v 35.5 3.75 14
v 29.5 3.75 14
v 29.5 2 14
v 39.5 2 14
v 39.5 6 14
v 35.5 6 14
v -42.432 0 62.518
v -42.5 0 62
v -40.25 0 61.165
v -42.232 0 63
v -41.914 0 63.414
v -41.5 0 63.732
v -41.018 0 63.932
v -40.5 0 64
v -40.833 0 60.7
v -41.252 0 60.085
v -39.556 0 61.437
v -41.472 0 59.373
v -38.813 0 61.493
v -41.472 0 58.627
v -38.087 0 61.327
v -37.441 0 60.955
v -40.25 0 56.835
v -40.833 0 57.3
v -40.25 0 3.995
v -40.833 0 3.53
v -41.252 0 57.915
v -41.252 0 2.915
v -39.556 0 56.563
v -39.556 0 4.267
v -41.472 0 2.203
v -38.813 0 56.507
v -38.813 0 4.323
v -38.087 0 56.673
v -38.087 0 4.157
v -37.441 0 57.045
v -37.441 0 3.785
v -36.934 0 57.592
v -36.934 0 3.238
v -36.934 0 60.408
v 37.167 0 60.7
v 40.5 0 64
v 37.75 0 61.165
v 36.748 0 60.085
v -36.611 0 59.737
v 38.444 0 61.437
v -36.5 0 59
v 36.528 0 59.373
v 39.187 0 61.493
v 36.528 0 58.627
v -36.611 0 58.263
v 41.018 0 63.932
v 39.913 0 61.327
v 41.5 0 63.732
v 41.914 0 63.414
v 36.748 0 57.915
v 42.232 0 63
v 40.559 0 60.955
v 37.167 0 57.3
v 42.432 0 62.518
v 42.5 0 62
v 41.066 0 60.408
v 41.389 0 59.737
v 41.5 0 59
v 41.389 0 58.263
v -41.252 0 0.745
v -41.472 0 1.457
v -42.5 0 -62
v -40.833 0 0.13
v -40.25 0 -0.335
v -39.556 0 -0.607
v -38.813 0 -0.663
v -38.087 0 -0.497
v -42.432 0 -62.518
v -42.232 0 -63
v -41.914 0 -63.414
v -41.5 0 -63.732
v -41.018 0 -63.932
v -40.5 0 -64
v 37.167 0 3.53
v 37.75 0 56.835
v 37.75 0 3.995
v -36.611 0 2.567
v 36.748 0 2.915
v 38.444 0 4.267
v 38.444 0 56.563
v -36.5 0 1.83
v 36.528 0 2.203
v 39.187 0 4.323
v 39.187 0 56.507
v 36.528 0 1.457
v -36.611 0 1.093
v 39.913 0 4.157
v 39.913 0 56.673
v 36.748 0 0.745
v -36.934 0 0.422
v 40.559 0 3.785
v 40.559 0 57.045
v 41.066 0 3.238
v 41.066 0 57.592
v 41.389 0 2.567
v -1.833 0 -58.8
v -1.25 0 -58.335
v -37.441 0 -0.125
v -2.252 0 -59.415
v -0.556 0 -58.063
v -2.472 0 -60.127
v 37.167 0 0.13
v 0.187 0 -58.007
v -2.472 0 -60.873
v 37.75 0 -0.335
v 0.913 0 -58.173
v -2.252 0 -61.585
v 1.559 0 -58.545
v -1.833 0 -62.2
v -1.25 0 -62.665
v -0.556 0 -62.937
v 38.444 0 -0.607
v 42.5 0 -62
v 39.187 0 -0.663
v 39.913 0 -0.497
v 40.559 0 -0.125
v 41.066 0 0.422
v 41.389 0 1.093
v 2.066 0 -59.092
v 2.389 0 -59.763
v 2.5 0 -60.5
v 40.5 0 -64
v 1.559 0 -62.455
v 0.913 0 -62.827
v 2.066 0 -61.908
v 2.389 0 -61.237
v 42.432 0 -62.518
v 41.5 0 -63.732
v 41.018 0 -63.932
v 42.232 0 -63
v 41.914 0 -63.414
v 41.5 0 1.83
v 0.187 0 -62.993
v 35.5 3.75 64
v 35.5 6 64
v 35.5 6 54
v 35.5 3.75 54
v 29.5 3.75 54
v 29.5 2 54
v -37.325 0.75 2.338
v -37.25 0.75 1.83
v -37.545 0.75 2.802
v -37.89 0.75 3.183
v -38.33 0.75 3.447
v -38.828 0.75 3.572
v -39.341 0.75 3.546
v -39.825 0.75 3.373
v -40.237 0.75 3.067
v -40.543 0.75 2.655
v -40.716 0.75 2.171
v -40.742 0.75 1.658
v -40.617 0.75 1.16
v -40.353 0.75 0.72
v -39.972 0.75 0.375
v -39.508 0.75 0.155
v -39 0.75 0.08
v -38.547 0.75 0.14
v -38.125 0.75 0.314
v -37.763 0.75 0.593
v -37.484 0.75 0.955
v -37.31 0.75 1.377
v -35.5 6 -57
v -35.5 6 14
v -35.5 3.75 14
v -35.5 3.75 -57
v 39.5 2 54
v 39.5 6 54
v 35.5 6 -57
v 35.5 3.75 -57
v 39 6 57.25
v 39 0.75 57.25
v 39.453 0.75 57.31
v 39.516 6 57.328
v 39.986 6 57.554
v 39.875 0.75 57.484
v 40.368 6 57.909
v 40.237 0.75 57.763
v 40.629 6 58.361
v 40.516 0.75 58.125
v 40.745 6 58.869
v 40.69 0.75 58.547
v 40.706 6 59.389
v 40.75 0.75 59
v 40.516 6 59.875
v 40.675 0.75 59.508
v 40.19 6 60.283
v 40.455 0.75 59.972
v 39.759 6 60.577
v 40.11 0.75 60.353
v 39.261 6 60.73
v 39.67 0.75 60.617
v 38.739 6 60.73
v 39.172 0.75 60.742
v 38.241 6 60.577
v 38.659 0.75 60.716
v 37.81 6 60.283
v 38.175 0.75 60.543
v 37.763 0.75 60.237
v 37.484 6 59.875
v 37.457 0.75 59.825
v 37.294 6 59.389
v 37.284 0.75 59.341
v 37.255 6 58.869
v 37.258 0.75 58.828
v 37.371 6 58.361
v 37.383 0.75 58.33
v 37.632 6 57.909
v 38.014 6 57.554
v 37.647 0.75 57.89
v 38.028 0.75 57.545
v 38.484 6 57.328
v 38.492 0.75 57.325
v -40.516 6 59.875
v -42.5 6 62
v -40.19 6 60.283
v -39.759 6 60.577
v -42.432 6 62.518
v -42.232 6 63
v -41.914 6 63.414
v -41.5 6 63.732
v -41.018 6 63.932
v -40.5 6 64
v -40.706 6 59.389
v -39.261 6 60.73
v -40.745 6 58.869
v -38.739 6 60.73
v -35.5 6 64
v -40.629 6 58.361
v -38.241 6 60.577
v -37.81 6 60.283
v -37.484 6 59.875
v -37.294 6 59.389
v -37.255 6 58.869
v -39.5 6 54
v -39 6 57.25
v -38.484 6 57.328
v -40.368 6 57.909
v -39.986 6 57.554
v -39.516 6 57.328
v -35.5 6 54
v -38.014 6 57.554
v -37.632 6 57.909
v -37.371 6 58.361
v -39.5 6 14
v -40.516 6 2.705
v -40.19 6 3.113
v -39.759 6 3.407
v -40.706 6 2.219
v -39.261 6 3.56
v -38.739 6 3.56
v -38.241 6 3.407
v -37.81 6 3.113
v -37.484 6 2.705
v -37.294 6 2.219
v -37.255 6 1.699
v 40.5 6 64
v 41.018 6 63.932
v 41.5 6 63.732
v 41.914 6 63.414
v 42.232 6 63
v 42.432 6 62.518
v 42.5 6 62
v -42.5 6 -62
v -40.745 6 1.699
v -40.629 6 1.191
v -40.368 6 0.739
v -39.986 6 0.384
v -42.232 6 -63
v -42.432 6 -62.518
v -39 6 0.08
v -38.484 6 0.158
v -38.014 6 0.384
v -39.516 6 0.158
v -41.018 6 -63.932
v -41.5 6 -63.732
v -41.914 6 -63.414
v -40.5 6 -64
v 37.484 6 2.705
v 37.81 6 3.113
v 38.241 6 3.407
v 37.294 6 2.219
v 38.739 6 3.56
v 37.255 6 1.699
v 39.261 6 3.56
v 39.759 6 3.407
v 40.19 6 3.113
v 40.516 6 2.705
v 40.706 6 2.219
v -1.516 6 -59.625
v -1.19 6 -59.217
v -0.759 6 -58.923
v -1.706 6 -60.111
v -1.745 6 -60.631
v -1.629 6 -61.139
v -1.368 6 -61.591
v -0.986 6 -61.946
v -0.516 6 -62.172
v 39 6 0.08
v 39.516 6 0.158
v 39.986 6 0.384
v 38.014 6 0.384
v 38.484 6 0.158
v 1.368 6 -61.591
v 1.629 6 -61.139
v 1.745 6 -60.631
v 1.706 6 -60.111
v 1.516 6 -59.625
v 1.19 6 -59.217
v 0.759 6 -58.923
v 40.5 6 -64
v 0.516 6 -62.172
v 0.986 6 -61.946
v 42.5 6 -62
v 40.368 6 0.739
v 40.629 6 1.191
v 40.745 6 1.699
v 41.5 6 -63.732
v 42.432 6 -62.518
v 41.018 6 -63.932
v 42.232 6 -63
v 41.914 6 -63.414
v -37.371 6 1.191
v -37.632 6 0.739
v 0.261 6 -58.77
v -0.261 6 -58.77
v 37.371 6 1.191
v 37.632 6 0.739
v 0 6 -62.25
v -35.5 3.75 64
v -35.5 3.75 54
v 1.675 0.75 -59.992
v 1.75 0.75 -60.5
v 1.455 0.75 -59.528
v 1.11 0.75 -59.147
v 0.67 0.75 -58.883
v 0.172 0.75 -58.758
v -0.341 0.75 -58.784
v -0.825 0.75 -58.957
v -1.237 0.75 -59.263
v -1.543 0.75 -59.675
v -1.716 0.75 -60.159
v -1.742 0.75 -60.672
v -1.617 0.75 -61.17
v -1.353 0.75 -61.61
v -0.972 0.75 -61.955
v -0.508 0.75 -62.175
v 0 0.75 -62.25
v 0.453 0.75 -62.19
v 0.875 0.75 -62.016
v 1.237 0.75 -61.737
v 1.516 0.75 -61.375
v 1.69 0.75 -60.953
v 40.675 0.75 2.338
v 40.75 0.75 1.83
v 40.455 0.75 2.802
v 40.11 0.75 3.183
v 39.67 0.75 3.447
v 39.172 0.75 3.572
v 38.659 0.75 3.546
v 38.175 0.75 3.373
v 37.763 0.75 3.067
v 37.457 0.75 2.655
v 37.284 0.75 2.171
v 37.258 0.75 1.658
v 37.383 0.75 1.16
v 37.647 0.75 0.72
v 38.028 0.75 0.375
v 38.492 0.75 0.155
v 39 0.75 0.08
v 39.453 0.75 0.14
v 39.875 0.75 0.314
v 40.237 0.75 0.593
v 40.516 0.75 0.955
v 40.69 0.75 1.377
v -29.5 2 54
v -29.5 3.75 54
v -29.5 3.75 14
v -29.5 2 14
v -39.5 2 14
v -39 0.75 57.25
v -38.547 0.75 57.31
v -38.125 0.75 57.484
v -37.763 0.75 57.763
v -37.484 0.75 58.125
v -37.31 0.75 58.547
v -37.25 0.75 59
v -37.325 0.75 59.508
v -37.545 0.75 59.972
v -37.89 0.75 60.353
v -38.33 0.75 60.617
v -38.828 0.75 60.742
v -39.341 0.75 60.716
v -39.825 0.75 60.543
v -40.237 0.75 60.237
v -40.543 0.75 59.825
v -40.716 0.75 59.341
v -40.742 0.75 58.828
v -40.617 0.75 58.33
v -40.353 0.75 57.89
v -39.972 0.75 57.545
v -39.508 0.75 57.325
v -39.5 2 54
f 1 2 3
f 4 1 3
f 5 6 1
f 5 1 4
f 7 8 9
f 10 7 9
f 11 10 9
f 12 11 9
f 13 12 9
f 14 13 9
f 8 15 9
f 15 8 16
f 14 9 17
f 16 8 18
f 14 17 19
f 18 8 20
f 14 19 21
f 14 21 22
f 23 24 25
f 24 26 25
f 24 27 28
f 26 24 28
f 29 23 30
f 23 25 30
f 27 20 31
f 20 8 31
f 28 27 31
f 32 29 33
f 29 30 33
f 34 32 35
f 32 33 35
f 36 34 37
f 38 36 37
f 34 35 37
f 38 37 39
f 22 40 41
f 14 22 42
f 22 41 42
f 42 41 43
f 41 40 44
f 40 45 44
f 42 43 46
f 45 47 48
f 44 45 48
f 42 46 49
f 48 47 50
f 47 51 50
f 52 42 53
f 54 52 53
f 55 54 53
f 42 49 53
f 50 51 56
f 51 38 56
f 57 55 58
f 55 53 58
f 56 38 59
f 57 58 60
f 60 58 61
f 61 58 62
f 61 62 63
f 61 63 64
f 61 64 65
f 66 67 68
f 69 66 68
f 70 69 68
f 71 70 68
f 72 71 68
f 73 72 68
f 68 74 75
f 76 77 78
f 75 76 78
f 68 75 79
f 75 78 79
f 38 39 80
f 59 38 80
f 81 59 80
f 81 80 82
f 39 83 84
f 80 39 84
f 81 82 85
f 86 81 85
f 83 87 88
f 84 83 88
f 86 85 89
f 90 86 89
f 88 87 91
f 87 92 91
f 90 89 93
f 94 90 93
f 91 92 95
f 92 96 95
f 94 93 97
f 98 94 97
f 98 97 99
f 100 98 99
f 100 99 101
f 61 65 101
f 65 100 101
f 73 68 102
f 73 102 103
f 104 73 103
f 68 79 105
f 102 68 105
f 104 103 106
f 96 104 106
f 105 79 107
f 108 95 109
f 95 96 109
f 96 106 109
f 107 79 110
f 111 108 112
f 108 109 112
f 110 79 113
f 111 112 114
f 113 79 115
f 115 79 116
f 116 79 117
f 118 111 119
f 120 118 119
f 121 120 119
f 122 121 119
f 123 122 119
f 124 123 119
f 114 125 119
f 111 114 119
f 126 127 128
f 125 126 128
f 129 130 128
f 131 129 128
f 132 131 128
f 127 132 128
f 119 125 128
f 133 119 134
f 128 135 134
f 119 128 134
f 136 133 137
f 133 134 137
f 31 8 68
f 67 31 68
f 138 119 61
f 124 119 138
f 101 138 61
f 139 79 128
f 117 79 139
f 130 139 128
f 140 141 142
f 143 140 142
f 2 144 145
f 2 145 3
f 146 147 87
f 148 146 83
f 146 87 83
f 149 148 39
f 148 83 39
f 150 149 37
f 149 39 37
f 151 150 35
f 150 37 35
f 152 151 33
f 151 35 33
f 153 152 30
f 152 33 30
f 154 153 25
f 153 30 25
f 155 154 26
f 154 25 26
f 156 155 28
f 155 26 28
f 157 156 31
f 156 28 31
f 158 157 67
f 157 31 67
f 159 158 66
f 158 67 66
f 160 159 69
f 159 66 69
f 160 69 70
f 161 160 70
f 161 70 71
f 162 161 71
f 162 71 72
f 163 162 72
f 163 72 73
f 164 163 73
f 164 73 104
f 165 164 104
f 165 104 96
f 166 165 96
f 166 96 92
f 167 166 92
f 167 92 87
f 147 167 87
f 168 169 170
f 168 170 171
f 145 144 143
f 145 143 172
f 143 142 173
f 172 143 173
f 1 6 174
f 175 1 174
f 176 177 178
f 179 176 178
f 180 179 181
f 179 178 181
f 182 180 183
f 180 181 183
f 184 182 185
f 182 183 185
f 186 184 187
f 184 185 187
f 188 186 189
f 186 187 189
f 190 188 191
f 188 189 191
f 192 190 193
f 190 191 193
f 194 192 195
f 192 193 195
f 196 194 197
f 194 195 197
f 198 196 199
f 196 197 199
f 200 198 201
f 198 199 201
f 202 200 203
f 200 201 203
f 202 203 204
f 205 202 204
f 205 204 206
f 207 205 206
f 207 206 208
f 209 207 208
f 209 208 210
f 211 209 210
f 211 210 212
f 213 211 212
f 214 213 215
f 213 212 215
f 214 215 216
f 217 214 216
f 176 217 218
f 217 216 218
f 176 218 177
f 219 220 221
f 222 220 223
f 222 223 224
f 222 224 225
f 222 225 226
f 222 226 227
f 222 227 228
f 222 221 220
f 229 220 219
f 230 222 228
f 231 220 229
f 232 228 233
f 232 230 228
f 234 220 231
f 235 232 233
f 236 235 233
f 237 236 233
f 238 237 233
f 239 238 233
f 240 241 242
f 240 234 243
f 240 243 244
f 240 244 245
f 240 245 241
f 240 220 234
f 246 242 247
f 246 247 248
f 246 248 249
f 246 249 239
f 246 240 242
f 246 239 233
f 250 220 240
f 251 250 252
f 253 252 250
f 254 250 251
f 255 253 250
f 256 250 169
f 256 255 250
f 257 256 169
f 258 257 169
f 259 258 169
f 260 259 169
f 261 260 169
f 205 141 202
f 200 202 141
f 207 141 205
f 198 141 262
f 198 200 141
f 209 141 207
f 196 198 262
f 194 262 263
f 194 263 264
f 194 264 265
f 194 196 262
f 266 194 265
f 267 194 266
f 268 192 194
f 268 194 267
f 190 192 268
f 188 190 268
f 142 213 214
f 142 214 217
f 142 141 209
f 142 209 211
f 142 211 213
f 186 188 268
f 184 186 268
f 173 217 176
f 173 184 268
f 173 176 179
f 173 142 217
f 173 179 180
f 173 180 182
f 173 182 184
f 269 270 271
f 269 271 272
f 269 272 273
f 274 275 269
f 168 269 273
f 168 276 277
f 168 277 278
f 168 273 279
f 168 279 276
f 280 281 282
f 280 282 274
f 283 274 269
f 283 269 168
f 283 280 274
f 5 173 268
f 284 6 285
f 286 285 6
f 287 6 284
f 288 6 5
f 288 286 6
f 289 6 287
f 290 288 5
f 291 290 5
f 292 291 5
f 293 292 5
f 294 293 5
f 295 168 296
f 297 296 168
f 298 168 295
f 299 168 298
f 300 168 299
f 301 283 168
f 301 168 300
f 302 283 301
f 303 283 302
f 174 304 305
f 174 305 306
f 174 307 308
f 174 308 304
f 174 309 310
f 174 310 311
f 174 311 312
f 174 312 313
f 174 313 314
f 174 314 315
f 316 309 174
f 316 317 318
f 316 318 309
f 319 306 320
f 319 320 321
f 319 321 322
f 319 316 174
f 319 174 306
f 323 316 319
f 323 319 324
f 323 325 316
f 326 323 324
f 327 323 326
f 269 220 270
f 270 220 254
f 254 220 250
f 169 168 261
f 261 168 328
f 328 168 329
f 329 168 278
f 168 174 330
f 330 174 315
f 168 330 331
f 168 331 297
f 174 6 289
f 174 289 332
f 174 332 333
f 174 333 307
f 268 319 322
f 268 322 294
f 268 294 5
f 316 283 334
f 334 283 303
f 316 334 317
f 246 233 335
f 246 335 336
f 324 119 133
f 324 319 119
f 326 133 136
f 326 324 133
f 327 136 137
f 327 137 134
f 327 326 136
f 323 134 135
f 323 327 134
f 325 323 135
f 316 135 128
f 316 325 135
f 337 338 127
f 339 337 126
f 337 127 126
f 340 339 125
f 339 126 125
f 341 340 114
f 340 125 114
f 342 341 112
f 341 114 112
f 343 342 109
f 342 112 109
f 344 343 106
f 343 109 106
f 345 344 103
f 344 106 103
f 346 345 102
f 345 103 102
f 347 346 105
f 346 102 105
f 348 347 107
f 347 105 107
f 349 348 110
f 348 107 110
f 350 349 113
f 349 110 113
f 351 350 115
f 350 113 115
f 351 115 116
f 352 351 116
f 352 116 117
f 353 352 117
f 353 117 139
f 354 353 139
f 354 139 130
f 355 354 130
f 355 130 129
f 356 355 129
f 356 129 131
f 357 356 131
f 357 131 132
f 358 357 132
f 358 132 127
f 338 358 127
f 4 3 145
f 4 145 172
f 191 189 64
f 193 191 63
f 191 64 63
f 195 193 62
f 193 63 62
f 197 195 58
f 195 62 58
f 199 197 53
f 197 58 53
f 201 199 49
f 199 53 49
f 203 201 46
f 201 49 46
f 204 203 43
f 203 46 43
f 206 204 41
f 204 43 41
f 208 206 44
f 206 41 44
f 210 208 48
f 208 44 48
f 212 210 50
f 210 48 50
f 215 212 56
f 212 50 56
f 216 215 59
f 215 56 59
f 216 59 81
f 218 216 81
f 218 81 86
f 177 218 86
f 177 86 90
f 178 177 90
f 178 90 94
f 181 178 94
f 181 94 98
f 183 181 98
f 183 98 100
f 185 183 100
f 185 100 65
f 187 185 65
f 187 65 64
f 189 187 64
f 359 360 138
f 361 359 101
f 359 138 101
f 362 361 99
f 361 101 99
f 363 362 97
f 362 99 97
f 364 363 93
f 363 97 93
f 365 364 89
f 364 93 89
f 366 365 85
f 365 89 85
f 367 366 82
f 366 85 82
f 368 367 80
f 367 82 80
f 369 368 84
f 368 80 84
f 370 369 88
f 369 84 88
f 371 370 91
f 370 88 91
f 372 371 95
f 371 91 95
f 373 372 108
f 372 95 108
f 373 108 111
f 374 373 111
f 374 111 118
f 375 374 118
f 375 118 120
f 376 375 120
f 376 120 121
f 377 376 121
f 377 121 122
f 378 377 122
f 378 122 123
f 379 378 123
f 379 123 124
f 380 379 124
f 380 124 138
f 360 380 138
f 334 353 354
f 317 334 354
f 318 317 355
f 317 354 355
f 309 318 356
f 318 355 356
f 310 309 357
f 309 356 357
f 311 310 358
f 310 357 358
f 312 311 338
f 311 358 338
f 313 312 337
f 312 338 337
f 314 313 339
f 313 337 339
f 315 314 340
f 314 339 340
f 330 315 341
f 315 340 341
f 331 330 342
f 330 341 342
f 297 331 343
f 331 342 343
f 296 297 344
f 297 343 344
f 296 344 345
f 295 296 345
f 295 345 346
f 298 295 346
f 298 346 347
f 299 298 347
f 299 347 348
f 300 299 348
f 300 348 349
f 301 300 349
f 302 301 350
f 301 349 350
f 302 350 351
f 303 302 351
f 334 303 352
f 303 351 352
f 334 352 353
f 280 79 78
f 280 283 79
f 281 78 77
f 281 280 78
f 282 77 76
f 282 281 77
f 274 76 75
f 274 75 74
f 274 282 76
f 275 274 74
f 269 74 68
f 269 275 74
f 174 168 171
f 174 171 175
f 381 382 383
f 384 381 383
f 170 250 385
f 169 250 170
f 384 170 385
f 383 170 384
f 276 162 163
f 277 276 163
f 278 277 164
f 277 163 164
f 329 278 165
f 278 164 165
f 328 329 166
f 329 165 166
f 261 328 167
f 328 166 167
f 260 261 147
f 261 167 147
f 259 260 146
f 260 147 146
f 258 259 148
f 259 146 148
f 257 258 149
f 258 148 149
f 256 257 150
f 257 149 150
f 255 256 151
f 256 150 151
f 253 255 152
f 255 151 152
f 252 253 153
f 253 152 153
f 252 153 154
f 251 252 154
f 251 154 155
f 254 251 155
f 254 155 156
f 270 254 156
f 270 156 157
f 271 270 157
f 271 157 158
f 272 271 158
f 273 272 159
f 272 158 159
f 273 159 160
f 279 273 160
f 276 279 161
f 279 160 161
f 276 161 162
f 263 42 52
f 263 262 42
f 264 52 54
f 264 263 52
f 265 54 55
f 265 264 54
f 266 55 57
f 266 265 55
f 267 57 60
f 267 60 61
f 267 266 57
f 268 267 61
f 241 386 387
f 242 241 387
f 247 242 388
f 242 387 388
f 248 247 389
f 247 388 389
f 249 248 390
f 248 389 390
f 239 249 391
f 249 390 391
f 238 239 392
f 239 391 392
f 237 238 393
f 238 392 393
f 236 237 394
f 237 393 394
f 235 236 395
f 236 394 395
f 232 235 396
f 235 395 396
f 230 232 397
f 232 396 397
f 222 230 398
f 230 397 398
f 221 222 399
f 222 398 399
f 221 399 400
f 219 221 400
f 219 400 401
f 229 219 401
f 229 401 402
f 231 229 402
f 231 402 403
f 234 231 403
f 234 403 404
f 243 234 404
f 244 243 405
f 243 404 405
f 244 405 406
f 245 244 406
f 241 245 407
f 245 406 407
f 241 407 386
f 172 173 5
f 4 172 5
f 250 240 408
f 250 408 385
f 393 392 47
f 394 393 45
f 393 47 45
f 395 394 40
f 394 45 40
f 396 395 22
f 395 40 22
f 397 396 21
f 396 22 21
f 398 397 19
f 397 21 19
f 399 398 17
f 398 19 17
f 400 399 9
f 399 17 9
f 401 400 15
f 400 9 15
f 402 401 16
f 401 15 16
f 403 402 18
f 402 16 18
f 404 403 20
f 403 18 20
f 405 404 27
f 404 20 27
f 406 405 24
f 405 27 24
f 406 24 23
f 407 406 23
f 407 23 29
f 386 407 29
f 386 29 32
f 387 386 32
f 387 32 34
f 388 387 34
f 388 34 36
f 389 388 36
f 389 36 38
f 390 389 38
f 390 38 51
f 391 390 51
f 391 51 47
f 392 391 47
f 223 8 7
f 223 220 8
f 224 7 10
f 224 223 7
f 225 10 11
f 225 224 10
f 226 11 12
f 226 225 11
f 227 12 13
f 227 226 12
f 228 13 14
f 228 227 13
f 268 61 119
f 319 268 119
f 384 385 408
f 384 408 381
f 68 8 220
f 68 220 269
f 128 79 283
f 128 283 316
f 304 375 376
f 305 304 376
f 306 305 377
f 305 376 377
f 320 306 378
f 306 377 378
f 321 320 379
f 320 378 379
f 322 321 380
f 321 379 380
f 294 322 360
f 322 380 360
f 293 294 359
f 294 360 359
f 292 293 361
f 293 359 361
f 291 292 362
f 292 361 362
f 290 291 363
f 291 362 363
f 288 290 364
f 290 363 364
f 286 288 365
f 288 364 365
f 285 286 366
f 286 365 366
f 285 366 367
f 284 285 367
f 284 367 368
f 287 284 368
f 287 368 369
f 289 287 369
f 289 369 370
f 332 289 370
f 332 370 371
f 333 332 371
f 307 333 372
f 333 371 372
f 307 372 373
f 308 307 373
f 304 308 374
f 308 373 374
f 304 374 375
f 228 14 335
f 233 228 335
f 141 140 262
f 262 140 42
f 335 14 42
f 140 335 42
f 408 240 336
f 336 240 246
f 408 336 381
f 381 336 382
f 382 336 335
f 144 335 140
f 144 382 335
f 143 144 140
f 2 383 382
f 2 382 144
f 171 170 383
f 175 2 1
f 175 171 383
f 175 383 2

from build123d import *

# Parameters (mm, degrees)
SKETCH1_W                  = 85
SKETCH1_H                  = 128
TOP_LID_DEPTH              = 6
SKETCH2_R                  = 1.75
SCREW_HOLE_DEPTH           = 10
SKETCH5_R                  = 2.5
SCREW_HEAD_DEPTH           = 2
SCREW_HEAD_DRAFT           = -45
SCREW_HEAD_PROFILE_2_DEPTH = 2
SCREW_HEAD_PROFILE_2_DRAFT = -45
SCREW_HEAD_PROFILE_3_DEPTH = 2
SCREW_HEAD_PROFILE_3_DRAFT = -45
SCREW_HEAD_PROFILE_4_DEPTH = 2
SCREW_HEAD_PROFILE_4_DRAFT = -45
SCREW_HEAD_PROFILE_5_DEPTH = 2
SCREW_HEAD_PROFILE_5_DRAFT = -45
SKETCH6_W                  = 71
SKETCH6_H                  = 121
DEVICE_CUT_OUT_DEPTH       = 2.25
SKETCH7_W                  = 10
SKETCH7_H                  = 40
SLIDERS_DEPTH              = 4
FILLET1_R                  = 2
FILLET2_R                  = 2
FILLET3_R                  = 2
FILLET4_R                  = 2


with BuildPart() as part:
    # Sketch1 → Top Lid (new body)
    with BuildSketch(Plane(origin=(0, 0, 0), x_dir=(1, 0, 0), z_dir=(0, 1, 0))):
        Rectangle(SKETCH1_W, SKETCH1_H)
    extrude(amount=TOP_LID_DEPTH)

    # Sketch2 → Screw Hole (cut)
    with BuildSketch(Plane.XZ):
        with Locations(Location((39, 59, 0), (0, 0, 270))):
            Circle(SKETCH2_R)
        with Locations(Location((-39, 59, 0), (0, 0, 270))):
            Circle(SKETCH2_R)
        with Locations(Location((-39, 1.83, 0), (0, 0, 270))):
            Circle(SKETCH2_R)
        with Locations(Location((39, 1.83, 0), (0, 0, 270))):
            Circle(SKETCH2_R)
        with Locations(Location((0, -60.5, 0), (0, 0, 270))):
            Circle(SKETCH2_R)
    extrude(amount=-SCREW_HOLE_DEPTH, mode=Mode.SUBTRACT)


with BuildPart() as screw_head_tool:
    # Sketch5 → Screw Head (with draft: the straight prism first)
    with BuildSketch(Plane.XZ):
        with Locations((39, 59)):
            Circle(SKETCH5_R)
    extrude(amount=-SCREW_HEAD_DEPTH)
    # Screw Head: the draft: its side faces are tilted about the plane it starts from
    screw_head_sides = [screw_head_tool.faces().sort_by_distance(p)[0] for p in [
        (36.5, 1, 59),
    ]]
    draft(screw_head_sides, Plane.XZ, SCREW_HEAD_DRAFT)


with BuildPart() as part_1:
    add(part.part)

    # Screw Head: cut by screw_head_tool
    add(screw_head_tool.part, mode=Mode.SUBTRACT)


with BuildPart() as screw_head_profile_2_tool:
    # Sketch5 → Screw Head profile 2 (with draft: the straight prism first)
    with BuildSketch(Plane.XZ):
        with Locations((-39, 59)):
            Circle(SKETCH5_R)
    extrude(amount=-SCREW_HEAD_PROFILE_2_DEPTH)
    # Screw Head profile 2: the draft: its side faces are tilted about the plane it starts from
    screw_head_profile_2_sides = [screw_head_profile_2_tool.faces().sort_by_distance(p)[0] for p in [
        (-41.5, 1, 59),
    ]]
    draft(screw_head_profile_2_sides, Plane.XZ, SCREW_HEAD_PROFILE_2_DRAFT)


with BuildPart() as part_2:
    add(part_1.part)

    # Screw Head profile 2: cut by screw_head_profile_2_tool
    add(screw_head_profile_2_tool.part, mode=Mode.SUBTRACT)


with BuildPart() as screw_head_profile_3_tool:
    # Sketch5 → Screw Head profile 3 (with draft: the straight prism first)
    with BuildSketch(Plane.XZ):
        with Locations((-39, 1.83)):
            Circle(SKETCH5_R)
    extrude(amount=-SCREW_HEAD_PROFILE_3_DEPTH)
    # Screw Head profile 3: the draft: its side faces are tilted about the plane it starts from
    screw_head_profile_3_sides = [screw_head_profile_3_tool.faces().sort_by_distance(p)[0] for p in [
        (-41.5, 1, 1.83),
    ]]
    draft(screw_head_profile_3_sides, Plane.XZ, SCREW_HEAD_PROFILE_3_DRAFT)


with BuildPart() as part_3:
    add(part_2.part)

    # Screw Head profile 3: cut by screw_head_profile_3_tool
    add(screw_head_profile_3_tool.part, mode=Mode.SUBTRACT)


with BuildPart() as screw_head_profile_4_tool:
    # Sketch5 → Screw Head profile 4 (with draft: the straight prism first)
    with BuildSketch(Plane.XZ):
        with Locations((39, 1.83)):
            Circle(SKETCH5_R)
    extrude(amount=-SCREW_HEAD_PROFILE_4_DEPTH)
    # Screw Head profile 4: the draft: its side faces are tilted about the plane it starts from
    screw_head_profile_4_sides = [screw_head_profile_4_tool.faces().sort_by_distance(p)[0] for p in [
        (36.5, 1, 1.83),
    ]]
    draft(screw_head_profile_4_sides, Plane.XZ, SCREW_HEAD_PROFILE_4_DRAFT)


with BuildPart() as part_4:
    add(part_3.part)

    # Screw Head profile 4: cut by screw_head_profile_4_tool
    add(screw_head_profile_4_tool.part, mode=Mode.SUBTRACT)


with BuildPart() as screw_head_profile_5_tool:
    # Sketch5 → Screw Head profile 5 (with draft: the straight prism first)
    with BuildSketch(Plane.XZ):
        with Locations((0, -60.5)):
            Circle(SKETCH5_R)
    extrude(amount=-SCREW_HEAD_PROFILE_5_DEPTH)
    # Screw Head profile 5: the draft: its side faces are tilted about the plane it starts from
    screw_head_profile_5_sides = [screw_head_profile_5_tool.faces().sort_by_distance(p)[0] for p in [
        (-2.5, 1, -60.5),
    ]]
    draft(screw_head_profile_5_sides, Plane.XZ, SCREW_HEAD_PROFILE_5_DRAFT)


with BuildPart() as part_5:
    add(part_4.part)

    # Screw Head profile 5: cut by screw_head_profile_5_tool
    add(screw_head_profile_5_tool.part, mode=Mode.SUBTRACT)

    # Sketch6 → Device cut out (cut)
    with BuildSketch(Plane(origin=(0, 6, 0), x_dir=(1, 0, 0), z_dir=(0, 1, 0))):
        with Locations((0, -3.5)):
            Rectangle(SKETCH6_W, SKETCH6_H)
    extrude(amount=-DEVICE_CUT_OUT_DEPTH, mode=Mode.SUBTRACT)

    # Sketch7 → Sliders (cut)
    with BuildSketch(Plane(origin=(0, 6, 0), x_dir=(1, 0, 0), z_dir=(0, 1, 0))):
        with Locations((34.5, -34)):
            Rectangle(SKETCH7_W, SKETCH7_H)
        with Locations((-34.5, -34)):
            Rectangle(SKETCH7_W, SKETCH7_H)
    extrude(amount=-SLIDERS_DEPTH, mode=Mode.SUBTRACT)

    # Fillet1
    fillet1_edges = [part_5.edges().sort_by_distance(p)[0] for p in [
        (42.5, 3, 64),
    ]]
    fillet(fillet1_edges, radius=FILLET1_R)

    # Fillet2
    fillet2_edges = [part_5.edges().sort_by_distance(p)[0] for p in [
        (42.5, 3, -64),
    ]]
    fillet(fillet2_edges, radius=FILLET2_R)

    # Fillet3
    fillet3_edges = [part_5.edges().sort_by_distance(p)[0] for p in [
        (-42.5, 3, -64),
    ]]
    fillet(fillet3_edges, radius=FILLET3_R)

    # Fillet4
    fillet4_edges = [part_5.edges().sort_by_distance(p)[0] for p in [
        (-42.5, 3, 64),
    ]]
    fillet(fillet4_edges, radius=FILLET4_R)


solid = part_5.part
